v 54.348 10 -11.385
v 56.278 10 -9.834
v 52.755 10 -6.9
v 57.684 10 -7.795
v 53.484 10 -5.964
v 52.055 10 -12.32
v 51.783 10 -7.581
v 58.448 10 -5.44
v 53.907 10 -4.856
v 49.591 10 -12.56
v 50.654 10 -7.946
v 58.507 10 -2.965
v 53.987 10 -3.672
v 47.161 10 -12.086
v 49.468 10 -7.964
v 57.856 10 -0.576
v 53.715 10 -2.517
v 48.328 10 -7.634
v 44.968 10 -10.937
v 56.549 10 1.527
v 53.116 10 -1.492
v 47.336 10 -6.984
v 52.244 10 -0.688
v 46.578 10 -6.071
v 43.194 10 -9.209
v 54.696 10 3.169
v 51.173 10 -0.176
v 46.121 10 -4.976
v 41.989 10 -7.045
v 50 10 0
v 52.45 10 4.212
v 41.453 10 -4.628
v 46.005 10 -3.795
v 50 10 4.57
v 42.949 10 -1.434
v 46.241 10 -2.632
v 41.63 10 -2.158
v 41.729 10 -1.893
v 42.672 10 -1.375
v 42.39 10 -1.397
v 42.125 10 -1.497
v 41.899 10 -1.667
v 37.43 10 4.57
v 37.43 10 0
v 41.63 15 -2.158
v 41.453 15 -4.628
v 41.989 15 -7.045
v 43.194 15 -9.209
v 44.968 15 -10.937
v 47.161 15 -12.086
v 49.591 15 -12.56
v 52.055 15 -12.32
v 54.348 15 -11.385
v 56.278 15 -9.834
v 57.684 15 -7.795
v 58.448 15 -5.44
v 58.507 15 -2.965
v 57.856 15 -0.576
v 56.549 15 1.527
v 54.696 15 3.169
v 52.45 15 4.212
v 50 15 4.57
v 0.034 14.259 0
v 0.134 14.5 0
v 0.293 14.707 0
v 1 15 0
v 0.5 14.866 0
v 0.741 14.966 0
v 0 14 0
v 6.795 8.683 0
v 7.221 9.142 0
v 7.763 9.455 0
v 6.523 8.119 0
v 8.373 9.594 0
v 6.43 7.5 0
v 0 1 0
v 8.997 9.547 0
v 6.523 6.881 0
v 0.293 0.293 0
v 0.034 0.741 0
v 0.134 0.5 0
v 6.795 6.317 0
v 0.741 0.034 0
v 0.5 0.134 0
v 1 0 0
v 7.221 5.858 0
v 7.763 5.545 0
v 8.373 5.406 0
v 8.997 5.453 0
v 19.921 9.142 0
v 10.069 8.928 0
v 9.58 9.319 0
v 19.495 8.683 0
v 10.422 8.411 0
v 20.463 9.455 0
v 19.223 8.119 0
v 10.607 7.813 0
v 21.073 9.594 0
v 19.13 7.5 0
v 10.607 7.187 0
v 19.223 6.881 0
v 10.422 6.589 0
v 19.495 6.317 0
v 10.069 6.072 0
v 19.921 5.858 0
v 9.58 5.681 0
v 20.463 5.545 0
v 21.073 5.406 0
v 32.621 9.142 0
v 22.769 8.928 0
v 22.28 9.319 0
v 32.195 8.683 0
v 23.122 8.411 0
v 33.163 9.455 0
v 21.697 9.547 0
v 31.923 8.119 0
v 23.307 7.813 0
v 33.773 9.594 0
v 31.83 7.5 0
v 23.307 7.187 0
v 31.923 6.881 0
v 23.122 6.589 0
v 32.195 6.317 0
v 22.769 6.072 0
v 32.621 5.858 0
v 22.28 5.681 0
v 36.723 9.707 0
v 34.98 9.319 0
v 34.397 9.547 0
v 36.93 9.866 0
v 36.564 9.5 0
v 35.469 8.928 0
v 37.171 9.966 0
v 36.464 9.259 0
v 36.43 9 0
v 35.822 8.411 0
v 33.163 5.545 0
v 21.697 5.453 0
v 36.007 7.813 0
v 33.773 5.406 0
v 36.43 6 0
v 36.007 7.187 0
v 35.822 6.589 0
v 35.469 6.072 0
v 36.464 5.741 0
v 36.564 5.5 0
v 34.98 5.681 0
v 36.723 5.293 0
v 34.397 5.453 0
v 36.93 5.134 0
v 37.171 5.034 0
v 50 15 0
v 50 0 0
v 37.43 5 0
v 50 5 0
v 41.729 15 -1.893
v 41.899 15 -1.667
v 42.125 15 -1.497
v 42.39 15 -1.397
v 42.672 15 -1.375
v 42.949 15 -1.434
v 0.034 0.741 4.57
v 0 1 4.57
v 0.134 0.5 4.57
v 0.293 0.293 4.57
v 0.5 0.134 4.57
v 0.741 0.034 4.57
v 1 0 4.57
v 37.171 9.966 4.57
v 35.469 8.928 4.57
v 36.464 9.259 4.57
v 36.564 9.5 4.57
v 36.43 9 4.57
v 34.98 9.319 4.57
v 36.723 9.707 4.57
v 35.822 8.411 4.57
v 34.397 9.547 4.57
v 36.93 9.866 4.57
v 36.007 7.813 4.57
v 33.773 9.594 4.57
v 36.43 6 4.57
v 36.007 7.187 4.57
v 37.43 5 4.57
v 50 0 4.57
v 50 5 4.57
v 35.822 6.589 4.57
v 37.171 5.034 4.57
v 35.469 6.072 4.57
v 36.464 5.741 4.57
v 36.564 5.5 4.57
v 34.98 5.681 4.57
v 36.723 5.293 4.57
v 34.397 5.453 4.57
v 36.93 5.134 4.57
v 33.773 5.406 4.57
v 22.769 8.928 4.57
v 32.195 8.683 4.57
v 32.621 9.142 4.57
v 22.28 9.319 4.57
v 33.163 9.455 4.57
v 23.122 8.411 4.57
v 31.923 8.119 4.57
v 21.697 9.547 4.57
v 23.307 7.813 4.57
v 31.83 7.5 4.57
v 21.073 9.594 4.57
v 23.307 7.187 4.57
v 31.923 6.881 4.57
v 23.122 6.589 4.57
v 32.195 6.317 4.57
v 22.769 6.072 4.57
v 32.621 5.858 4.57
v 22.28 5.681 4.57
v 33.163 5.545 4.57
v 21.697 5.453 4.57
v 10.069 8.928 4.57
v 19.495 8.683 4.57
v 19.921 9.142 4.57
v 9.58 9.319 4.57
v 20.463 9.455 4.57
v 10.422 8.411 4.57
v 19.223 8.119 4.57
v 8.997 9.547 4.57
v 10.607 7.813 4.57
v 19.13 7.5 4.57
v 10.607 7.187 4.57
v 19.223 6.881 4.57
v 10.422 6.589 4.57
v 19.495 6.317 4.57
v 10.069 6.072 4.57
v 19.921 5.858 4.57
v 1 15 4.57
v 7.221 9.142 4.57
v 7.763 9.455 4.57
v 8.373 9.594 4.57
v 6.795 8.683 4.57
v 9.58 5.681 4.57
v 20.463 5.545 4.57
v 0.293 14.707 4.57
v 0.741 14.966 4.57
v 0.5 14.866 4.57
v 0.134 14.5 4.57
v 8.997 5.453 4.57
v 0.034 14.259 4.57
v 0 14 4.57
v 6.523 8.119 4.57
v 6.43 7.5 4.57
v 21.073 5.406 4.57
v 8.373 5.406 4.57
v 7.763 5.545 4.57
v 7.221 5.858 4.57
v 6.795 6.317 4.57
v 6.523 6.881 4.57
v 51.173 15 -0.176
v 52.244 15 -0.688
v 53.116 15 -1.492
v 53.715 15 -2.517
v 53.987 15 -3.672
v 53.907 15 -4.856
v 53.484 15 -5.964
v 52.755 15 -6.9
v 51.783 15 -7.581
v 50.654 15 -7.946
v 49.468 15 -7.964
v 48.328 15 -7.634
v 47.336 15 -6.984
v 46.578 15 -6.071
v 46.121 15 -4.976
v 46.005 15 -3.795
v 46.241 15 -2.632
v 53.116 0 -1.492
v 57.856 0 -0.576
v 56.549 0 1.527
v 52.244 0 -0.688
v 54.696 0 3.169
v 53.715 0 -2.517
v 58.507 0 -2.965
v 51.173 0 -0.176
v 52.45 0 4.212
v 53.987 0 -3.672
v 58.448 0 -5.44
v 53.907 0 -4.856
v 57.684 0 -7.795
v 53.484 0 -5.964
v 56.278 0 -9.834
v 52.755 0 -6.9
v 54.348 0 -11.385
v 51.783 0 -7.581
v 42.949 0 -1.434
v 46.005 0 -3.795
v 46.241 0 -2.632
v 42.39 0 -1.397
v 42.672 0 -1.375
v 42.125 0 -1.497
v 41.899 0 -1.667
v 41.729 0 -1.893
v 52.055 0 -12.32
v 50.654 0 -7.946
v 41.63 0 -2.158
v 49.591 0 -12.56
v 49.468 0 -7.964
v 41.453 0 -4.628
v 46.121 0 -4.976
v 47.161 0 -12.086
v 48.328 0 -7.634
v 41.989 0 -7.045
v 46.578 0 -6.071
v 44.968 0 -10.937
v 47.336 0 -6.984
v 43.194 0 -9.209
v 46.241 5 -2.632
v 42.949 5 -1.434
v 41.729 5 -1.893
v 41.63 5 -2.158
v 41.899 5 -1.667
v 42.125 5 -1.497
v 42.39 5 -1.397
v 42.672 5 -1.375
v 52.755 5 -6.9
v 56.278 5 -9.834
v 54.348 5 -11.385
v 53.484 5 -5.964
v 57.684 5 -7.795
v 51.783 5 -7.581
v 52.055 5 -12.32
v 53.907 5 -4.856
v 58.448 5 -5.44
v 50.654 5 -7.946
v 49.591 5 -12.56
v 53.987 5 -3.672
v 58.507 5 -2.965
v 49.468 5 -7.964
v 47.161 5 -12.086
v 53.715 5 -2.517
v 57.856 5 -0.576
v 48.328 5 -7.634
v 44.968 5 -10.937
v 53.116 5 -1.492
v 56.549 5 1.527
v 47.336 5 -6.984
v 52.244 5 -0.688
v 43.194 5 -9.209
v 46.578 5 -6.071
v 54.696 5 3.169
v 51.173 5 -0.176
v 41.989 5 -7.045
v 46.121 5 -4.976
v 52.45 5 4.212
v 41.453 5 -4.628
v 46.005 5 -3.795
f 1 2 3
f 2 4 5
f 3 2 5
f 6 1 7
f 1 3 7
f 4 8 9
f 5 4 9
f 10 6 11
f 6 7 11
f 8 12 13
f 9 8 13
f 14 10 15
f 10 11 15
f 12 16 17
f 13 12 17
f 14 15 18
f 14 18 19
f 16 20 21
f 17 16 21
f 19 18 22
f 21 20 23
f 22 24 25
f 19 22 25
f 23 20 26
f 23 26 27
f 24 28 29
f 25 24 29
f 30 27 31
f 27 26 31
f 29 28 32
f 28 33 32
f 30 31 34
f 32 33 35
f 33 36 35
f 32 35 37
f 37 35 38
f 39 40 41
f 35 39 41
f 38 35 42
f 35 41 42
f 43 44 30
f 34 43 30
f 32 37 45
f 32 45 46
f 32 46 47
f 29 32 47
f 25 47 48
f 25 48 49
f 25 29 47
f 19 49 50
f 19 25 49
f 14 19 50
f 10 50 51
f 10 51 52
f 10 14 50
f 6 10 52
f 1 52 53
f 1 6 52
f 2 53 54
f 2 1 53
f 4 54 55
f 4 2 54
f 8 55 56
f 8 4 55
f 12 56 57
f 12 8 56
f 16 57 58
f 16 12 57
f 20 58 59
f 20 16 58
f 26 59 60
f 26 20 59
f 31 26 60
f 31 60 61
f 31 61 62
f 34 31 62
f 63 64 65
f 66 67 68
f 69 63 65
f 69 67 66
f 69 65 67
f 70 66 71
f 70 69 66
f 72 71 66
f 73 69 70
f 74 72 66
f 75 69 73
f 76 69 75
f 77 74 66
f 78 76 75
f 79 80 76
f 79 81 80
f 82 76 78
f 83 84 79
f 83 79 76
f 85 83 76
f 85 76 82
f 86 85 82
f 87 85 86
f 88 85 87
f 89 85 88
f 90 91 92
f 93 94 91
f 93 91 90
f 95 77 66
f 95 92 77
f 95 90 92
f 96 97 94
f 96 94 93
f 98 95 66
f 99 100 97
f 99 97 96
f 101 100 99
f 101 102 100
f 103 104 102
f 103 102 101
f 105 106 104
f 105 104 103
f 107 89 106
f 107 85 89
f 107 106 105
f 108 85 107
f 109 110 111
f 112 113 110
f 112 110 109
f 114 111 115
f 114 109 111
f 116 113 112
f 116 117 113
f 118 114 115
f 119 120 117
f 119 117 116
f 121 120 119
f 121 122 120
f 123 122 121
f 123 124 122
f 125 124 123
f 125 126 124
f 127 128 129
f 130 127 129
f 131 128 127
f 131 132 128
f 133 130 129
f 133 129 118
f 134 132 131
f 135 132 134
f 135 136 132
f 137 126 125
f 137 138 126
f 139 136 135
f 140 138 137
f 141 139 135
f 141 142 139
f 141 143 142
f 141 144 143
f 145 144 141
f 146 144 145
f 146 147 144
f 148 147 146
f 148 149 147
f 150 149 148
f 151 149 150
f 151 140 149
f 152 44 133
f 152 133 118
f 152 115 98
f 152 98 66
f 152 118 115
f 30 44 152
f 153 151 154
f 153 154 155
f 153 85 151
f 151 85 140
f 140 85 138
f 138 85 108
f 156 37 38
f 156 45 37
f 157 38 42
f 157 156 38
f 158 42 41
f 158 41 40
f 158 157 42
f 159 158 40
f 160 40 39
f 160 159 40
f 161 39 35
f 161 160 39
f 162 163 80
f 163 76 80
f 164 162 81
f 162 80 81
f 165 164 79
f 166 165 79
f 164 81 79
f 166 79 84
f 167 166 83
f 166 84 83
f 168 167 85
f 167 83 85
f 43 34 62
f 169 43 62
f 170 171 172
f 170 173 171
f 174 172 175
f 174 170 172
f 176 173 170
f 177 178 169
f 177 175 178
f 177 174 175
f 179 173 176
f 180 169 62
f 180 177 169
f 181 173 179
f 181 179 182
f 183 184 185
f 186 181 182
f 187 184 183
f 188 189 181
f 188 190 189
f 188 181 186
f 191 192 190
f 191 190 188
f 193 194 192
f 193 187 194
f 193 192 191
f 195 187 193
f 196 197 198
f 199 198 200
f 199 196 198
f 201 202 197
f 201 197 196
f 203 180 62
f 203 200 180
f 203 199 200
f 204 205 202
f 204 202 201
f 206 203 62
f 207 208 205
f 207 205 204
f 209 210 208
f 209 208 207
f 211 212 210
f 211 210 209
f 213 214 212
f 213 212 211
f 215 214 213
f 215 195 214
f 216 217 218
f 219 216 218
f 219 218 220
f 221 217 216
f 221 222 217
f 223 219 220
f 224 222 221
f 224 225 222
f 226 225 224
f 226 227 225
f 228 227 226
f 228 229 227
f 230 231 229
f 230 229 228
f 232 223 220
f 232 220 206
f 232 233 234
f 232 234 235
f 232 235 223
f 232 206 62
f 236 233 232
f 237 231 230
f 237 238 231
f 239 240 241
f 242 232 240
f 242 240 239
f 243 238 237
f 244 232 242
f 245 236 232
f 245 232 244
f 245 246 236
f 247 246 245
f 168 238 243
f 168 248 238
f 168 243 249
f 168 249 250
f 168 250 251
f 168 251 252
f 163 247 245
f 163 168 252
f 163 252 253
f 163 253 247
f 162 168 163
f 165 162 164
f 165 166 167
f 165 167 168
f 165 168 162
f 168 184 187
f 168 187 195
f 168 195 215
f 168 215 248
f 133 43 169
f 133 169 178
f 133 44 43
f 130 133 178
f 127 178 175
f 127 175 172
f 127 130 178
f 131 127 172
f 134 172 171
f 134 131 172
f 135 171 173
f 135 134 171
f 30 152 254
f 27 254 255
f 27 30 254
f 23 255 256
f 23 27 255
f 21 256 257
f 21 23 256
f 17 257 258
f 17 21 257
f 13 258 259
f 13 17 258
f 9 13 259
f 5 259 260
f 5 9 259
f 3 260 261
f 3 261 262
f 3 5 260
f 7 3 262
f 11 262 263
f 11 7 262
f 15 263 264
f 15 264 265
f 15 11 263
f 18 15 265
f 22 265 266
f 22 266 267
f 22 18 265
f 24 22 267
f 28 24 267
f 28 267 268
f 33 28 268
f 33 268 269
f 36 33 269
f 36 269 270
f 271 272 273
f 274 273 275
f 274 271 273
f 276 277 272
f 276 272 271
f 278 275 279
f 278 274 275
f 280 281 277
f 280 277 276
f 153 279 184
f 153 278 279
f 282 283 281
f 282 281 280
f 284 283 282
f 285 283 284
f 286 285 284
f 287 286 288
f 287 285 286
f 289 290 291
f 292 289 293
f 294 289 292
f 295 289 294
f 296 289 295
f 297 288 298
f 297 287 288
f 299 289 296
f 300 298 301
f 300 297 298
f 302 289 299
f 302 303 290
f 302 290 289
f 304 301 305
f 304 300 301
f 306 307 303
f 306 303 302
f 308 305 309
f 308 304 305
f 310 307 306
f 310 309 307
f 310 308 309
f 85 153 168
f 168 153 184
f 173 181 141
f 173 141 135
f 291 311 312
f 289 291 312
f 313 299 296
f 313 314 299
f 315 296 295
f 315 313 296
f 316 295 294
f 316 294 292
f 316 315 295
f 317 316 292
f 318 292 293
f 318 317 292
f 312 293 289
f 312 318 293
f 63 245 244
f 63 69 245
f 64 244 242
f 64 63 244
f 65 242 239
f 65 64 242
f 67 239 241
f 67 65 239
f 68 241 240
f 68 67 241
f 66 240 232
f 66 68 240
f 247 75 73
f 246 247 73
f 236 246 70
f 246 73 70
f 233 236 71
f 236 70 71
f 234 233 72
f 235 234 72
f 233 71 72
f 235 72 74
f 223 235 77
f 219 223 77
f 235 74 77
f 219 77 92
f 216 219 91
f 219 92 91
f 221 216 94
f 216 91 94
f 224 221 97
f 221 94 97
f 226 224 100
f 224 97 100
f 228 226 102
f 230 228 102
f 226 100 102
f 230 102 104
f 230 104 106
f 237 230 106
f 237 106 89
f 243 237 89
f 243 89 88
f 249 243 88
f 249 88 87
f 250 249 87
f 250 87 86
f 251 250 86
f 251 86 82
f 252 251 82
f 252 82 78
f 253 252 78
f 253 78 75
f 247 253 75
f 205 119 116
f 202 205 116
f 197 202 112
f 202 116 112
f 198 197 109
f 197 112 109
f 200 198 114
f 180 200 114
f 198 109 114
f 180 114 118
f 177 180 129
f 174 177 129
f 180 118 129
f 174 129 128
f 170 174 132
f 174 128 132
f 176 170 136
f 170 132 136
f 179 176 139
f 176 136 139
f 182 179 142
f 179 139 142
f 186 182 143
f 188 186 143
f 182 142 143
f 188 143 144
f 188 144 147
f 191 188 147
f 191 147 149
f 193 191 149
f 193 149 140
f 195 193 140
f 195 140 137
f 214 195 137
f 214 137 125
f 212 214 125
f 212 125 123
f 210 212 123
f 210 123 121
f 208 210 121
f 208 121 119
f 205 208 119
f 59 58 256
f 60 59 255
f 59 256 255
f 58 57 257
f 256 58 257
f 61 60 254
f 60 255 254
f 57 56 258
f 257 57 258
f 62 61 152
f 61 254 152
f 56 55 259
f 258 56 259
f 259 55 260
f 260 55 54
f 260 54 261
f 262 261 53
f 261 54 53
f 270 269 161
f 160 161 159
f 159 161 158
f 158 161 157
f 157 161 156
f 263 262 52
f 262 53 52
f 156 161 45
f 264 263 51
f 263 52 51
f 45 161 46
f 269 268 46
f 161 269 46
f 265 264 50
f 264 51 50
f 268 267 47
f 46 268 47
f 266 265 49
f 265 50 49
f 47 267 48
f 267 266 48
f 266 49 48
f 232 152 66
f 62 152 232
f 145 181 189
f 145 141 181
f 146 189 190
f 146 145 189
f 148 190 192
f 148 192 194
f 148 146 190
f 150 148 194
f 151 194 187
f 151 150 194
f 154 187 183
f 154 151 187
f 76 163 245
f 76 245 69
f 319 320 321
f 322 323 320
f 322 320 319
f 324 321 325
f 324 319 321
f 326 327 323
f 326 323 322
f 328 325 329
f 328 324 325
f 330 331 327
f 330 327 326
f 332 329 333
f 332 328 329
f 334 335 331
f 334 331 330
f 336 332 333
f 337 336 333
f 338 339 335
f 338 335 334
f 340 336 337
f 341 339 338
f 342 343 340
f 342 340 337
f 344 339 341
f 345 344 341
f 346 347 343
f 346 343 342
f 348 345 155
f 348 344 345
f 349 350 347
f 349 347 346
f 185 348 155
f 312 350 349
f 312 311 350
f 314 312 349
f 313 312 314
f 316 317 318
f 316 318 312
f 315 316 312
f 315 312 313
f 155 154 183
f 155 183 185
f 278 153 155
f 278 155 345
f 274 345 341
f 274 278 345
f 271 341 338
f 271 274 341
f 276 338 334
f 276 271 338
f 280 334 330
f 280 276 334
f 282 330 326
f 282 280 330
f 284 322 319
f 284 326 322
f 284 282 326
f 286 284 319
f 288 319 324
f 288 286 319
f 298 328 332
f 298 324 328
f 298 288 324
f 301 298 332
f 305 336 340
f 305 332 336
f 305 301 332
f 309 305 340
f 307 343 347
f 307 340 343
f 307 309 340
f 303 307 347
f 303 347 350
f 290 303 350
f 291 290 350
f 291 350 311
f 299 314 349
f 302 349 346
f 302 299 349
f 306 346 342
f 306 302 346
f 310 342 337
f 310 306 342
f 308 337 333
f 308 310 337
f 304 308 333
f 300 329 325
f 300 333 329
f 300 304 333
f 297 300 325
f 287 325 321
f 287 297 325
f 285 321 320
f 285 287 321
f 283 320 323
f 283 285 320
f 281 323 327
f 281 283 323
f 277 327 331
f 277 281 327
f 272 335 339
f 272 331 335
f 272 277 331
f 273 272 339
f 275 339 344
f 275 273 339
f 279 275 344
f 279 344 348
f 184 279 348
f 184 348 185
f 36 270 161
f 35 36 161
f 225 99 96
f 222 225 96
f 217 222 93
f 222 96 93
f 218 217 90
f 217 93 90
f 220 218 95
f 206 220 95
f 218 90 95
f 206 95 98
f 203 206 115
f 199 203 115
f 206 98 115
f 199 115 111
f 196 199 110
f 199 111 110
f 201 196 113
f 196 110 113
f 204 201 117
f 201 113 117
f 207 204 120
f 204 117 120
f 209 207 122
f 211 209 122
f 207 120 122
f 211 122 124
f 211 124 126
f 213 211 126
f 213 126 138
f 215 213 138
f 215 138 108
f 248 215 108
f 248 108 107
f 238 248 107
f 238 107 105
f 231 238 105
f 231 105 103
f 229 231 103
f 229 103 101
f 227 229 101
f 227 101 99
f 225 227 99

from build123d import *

# Parameters (mm, degrees)
BASE_FLANGE1_DEPTH      = 15
CUT_EXTRUDE1_DEPTH      = 14
CUT_EXTRUDE1_DEPTH_BACK = 10
SKETCH6_W               = 22.14
SKETCH6_H               = 5
FILLET1_R               = 1
SKETCH7_R               = 2.1
CUT_EXTRUDE2_DEPTH      = 10


# Sheet-metal steps are written as plain solids
with BuildPart() as part:
    # Sketch1 → Base-Flange1 (new body)
    with BuildSketch(Plane(origin=(0, 0, 0), x_dir=(1, 0, 0), z_dir=(0, 1, 0))):
        with BuildLine():
            Line((0, 0), (50, 0))
            ThreePointArc((50, 0), (52.294305745, 7.276608177), (46.241229517, 2.631919427))
            Line((46.241229517, 2.631919427), (41.94683424, 1.068887372))
            ThreePointArc((41.94683424, 1.068887372), (54.91555006, 11.02013302), (50, -4.57))
            Line((50, -4.57), (0, -4.57))
            Line((0, -4.57), (0, 0))
        make_face()
    extrude(amount=BASE_FLANGE1_DEPTH)

    # Sketch6 → Cut-Extrude1 (cut, two sides: drawn at the far end of the back side and taken through both)
    with BuildSketch(Plane(origin=(0, 0, 0), x_dir=(-1, 0, 0), z_dir=(0, 0, -1)).offset(-CUT_EXTRUDE1_DEPTH_BACK)):
        with Locations((-47.5, 7.5)):
            Rectangle(SKETCH6_W, SKETCH6_H)
    extrude(amount=CUT_EXTRUDE1_DEPTH + CUT_EXTRUDE1_DEPTH_BACK, mode=Mode.SUBTRACT)

    # Fillet1
    fillet1_edges = [part.edges().sort_by_distance(p)[0] for p in [
        (41.94683424, 12.5, -1.068887372),
        (0, 15, 2.285),
        (41.94683424, 2.5, -1.068887372),
        (36.43, 5, 2.285),
        (36.43, 10, 2.285),
        (0, 0, 2.285),
    ]]
    fillet(fillet1_edges, radius=FILLET1_R)

    # Sketch7 → Cut-Extrude2 (cut)
    with BuildSketch(Plane(origin=(0, 0, 0), x_dir=(-1, 0, 0), z_dir=(0, 0, -1))):
        with Locations((-21.23, 7.5)):
            Circle(SKETCH7_R)
        with Locations((-33.93, 7.5)):
            Circle(SKETCH7_R)
        with Locations((-8.53, 7.5)):
            Circle(SKETCH7_R)
    extrude(amount=-CUT_EXTRUDE2_DEPTH, mode=Mode.SUBTRACT)


solid = part.part
